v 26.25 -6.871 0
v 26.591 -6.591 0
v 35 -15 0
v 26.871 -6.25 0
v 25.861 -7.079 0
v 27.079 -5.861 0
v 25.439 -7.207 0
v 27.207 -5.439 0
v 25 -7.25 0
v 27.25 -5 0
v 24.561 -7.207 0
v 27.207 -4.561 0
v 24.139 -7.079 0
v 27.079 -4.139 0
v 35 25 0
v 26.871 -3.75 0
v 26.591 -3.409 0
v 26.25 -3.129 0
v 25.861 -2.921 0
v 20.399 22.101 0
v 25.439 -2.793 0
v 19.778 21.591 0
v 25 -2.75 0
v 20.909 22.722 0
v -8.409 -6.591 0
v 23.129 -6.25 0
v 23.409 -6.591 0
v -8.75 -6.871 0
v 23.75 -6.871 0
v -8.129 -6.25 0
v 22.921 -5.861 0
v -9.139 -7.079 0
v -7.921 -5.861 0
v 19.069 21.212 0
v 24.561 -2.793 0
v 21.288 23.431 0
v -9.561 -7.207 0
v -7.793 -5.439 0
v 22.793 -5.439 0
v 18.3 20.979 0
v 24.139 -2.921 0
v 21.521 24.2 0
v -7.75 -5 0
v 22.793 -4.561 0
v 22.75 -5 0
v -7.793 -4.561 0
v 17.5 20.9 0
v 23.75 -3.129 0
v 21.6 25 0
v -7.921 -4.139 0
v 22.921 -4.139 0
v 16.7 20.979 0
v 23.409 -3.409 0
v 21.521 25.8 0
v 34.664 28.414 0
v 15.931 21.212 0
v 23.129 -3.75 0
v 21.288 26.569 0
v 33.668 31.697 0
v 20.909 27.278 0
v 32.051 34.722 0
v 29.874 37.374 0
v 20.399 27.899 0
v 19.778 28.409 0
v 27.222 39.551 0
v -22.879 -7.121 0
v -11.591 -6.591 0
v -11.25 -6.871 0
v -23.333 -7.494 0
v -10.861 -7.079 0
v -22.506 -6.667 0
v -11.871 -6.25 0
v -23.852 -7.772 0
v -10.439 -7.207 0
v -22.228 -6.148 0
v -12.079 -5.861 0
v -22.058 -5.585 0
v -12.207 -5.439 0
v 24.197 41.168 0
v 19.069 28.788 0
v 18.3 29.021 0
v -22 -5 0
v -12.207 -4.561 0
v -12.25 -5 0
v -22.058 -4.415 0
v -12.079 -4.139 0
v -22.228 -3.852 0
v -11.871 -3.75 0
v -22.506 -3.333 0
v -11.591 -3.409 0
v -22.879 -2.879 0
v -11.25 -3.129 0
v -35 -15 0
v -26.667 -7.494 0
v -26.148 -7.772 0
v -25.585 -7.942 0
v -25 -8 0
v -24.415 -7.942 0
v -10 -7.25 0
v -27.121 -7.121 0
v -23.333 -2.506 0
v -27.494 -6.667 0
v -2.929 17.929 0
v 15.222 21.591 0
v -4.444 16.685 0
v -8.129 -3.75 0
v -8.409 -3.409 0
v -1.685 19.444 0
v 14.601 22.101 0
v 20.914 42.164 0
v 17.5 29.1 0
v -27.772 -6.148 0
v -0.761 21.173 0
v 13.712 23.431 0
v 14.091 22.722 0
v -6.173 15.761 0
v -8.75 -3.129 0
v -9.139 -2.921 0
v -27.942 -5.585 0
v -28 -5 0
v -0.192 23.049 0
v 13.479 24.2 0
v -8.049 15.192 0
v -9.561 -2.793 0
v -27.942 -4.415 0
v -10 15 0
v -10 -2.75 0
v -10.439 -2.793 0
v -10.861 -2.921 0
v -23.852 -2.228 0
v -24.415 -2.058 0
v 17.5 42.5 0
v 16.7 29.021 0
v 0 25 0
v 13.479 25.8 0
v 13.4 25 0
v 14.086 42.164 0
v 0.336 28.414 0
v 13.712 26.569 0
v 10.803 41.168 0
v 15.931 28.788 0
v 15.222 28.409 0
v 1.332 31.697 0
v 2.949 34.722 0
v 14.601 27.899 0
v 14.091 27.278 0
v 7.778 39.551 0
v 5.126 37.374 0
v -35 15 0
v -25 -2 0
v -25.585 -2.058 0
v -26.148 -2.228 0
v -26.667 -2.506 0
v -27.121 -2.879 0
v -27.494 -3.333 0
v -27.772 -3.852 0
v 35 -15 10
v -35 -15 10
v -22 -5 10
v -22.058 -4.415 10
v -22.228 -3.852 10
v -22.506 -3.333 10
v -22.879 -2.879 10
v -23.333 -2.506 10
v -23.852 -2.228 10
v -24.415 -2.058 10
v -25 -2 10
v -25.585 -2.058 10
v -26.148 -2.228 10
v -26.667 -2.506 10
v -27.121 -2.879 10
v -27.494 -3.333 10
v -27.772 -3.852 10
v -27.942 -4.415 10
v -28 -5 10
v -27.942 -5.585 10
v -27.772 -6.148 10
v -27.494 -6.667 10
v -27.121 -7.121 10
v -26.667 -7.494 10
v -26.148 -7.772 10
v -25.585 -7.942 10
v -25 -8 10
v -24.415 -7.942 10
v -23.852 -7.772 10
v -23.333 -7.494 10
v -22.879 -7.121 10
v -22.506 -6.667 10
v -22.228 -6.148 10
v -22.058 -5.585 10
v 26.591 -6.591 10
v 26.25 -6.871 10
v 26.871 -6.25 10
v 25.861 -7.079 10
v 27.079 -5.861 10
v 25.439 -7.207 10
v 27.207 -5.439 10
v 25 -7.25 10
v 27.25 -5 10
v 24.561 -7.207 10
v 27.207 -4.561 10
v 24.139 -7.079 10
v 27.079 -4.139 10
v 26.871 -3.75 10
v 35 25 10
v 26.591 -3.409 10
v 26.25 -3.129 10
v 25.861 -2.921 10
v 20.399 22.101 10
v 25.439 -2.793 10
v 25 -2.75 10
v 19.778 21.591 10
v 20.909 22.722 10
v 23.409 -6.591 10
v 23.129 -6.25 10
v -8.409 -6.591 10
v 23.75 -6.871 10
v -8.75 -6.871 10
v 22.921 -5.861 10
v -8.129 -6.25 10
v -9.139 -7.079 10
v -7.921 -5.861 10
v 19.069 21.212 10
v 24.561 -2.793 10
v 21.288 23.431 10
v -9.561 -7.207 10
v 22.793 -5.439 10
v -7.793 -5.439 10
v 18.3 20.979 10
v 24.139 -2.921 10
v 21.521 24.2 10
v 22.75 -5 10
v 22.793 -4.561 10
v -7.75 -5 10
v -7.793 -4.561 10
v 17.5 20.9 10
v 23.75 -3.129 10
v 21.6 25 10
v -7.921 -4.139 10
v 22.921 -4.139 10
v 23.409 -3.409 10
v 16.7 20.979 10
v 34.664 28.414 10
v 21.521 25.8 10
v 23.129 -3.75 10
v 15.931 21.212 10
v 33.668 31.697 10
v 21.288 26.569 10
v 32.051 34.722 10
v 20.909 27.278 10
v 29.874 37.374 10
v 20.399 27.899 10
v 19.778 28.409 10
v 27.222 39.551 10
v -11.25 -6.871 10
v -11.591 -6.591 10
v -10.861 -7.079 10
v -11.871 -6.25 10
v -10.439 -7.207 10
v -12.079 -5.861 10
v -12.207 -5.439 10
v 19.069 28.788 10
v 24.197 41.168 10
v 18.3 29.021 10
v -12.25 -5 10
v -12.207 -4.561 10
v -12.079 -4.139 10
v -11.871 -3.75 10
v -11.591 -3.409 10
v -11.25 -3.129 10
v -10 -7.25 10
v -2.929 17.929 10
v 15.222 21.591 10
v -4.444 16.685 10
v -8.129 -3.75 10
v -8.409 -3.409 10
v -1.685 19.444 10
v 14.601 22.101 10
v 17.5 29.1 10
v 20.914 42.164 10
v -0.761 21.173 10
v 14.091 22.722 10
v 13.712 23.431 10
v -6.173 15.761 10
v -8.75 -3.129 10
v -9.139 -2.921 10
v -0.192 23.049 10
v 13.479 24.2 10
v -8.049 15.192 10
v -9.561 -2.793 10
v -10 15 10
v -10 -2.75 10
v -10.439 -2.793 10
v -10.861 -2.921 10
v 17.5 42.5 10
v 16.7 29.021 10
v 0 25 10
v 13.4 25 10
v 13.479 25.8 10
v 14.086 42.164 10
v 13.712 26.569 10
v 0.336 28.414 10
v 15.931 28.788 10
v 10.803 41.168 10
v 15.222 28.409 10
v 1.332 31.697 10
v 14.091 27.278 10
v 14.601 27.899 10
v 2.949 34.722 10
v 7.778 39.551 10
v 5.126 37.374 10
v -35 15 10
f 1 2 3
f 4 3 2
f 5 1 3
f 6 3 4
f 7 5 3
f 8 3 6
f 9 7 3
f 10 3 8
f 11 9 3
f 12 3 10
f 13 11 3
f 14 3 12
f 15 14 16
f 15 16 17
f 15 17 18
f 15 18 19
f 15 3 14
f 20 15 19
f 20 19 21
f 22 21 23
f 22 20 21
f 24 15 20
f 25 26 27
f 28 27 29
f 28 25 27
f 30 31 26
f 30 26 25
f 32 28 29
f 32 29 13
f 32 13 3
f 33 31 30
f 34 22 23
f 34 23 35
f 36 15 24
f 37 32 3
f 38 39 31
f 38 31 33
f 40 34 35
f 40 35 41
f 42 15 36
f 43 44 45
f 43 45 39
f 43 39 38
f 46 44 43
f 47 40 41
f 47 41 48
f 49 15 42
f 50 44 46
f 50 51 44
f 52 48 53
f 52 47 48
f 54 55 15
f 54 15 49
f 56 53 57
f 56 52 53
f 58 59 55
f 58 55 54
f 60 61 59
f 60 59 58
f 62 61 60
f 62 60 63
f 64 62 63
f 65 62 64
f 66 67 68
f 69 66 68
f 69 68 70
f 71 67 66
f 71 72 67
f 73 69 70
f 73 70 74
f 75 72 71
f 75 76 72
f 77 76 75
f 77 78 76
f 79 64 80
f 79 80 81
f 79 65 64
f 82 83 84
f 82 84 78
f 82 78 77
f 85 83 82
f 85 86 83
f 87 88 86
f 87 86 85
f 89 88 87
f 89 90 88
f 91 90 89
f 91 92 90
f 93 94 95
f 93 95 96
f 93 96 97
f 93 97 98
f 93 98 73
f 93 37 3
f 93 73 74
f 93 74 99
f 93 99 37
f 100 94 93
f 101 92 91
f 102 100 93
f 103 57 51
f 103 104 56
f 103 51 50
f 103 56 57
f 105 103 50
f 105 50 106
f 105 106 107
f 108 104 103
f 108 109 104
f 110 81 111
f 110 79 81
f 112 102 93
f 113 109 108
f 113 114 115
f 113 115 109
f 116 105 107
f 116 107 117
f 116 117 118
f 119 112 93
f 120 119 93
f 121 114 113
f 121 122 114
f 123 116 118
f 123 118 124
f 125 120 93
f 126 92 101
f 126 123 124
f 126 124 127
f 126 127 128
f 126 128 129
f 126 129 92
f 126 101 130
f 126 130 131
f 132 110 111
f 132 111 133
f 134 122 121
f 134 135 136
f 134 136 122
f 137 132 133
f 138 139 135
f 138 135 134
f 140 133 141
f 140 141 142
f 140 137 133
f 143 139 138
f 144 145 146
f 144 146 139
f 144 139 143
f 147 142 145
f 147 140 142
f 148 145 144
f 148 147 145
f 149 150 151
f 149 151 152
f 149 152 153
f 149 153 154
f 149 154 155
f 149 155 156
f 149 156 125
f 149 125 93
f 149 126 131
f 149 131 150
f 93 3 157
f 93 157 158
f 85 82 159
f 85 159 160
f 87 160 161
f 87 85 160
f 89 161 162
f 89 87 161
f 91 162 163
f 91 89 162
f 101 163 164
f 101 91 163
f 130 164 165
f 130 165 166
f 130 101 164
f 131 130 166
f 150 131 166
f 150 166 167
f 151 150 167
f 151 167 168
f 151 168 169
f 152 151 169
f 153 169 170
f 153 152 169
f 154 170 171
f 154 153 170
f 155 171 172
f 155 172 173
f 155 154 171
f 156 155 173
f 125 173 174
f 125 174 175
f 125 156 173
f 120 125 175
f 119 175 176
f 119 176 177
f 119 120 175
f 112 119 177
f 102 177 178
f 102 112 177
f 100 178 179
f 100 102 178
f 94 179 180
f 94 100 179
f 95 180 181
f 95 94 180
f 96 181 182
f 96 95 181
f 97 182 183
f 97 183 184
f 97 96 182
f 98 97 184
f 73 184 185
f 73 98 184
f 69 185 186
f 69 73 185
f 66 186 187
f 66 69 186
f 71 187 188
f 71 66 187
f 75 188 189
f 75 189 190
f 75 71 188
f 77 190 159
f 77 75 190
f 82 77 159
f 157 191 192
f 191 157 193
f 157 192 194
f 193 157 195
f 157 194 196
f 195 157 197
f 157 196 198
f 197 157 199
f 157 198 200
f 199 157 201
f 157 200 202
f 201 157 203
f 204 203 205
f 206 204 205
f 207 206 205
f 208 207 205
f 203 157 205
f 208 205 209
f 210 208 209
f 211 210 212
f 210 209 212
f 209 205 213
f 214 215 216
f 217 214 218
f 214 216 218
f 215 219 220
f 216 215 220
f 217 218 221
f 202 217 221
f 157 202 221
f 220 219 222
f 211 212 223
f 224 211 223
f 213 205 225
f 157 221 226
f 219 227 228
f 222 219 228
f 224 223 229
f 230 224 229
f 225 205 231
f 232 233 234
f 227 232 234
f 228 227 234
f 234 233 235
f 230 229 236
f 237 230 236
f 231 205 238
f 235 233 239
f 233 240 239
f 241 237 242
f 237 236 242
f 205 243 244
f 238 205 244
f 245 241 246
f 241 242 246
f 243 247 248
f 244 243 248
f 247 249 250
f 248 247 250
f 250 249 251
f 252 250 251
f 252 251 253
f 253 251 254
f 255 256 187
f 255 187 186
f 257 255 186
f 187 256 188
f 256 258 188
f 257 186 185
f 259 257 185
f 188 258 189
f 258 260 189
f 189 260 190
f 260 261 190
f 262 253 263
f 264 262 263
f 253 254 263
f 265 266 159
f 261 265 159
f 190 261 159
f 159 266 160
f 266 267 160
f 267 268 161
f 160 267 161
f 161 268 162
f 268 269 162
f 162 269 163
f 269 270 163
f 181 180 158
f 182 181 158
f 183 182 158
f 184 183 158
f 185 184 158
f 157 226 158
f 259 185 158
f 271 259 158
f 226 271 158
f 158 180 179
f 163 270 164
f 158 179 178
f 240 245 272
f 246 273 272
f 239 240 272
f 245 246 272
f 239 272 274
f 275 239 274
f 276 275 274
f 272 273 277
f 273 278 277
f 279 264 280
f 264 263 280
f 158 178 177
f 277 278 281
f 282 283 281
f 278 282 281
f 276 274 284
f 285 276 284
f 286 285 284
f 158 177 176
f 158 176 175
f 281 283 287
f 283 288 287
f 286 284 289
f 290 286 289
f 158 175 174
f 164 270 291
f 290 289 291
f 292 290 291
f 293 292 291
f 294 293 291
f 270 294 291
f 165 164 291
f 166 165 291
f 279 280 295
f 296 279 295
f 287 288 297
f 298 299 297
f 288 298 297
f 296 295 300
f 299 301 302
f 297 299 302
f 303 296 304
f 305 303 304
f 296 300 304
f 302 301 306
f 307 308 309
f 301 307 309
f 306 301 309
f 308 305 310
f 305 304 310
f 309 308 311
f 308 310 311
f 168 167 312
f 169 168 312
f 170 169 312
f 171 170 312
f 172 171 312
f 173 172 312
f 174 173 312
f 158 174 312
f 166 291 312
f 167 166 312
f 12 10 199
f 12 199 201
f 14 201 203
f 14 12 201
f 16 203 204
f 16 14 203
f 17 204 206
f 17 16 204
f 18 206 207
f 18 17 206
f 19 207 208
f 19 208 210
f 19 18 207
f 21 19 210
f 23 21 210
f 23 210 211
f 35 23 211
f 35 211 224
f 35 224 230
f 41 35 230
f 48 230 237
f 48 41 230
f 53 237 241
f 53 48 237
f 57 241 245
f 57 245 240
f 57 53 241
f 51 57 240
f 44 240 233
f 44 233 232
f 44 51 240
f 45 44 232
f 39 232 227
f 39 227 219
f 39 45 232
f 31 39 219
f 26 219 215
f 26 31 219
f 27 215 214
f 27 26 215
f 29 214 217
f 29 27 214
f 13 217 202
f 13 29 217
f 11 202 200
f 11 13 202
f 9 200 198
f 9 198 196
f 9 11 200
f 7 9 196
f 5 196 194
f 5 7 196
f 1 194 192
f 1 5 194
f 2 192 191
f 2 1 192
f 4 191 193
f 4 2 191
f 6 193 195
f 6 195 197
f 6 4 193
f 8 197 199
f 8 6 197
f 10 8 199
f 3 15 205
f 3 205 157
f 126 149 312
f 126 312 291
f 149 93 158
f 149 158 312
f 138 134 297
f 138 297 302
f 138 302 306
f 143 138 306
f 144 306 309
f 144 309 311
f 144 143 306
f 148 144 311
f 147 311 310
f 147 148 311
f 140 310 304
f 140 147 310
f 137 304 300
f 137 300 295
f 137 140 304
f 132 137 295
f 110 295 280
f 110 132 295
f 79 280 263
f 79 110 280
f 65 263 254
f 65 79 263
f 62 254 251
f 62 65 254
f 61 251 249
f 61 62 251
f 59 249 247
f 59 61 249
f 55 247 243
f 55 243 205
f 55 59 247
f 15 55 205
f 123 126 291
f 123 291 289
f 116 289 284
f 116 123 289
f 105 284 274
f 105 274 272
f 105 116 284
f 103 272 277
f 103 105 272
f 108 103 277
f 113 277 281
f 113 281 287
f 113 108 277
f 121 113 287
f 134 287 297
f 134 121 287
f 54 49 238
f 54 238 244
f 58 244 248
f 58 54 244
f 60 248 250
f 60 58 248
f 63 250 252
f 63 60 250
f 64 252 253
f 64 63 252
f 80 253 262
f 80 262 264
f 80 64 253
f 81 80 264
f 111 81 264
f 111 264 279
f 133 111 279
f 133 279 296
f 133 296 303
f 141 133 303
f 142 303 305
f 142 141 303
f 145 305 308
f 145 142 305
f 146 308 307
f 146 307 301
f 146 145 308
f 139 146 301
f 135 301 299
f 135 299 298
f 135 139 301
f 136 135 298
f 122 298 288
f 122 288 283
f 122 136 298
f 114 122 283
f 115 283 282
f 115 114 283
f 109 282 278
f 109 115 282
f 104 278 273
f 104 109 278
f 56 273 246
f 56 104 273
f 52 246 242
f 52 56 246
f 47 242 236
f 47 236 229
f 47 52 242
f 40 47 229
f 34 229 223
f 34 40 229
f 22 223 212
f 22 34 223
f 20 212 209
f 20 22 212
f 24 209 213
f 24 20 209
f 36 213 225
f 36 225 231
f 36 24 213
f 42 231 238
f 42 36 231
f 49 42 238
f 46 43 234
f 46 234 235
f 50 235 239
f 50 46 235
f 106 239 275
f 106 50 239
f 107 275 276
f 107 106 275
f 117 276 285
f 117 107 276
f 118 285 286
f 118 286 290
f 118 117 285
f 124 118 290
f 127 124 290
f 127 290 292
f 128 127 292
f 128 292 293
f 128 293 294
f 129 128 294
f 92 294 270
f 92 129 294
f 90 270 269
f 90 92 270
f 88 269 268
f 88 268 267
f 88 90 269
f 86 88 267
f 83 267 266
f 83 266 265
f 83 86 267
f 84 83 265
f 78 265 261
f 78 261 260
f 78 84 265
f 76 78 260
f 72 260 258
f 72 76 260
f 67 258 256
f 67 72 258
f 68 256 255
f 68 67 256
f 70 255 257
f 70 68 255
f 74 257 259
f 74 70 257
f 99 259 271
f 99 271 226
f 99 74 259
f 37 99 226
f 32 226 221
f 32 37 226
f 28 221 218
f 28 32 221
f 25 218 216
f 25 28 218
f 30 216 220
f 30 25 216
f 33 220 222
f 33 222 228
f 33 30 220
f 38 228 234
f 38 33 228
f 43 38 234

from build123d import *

# Parameters (mm, degrees)
SKETCH_2_R      = 4.1
SKETCH_2_R_2    = 3
SKETCH_2_R_3    = 2.25
EXTRUDE_1_DEPTH = 10


with BuildPart() as part:
    # 草图2 → 凸台-拉伸1 (new body)
    with BuildSketch(Plane.XY):
        with BuildLine():
            Line((-35, 15), (-10, 15))
            ThreePointArc((-10, 15), (-2.928932188, 17.928932188), (0, 25))
            ThreePointArc((0, 25), (17.5, 42.5), (35, 25))
            Line((35, 25), (35, 15))
            Line((35, 15), (35, -15))
            Line((35, -15), (-35, -15))
            Line((-35, -15), (-35, 15))
        make_face()
        with Locations((17.5, 25)):
            Circle(SKETCH_2_R, mode=Mode.SUBTRACT)
        with Locations((-25, -5)):
            Circle(SKETCH_2_R_2, mode=Mode.SUBTRACT)
        with Locations((-10, -5)):
            Circle(SKETCH_2_R_3, mode=Mode.SUBTRACT)
        with Locations((25, -5)):
            Circle(SKETCH_2_R_3, mode=Mode.SUBTRACT)
    extrude(amount=EXTRUDE_1_DEPTH)


solid = part.part
